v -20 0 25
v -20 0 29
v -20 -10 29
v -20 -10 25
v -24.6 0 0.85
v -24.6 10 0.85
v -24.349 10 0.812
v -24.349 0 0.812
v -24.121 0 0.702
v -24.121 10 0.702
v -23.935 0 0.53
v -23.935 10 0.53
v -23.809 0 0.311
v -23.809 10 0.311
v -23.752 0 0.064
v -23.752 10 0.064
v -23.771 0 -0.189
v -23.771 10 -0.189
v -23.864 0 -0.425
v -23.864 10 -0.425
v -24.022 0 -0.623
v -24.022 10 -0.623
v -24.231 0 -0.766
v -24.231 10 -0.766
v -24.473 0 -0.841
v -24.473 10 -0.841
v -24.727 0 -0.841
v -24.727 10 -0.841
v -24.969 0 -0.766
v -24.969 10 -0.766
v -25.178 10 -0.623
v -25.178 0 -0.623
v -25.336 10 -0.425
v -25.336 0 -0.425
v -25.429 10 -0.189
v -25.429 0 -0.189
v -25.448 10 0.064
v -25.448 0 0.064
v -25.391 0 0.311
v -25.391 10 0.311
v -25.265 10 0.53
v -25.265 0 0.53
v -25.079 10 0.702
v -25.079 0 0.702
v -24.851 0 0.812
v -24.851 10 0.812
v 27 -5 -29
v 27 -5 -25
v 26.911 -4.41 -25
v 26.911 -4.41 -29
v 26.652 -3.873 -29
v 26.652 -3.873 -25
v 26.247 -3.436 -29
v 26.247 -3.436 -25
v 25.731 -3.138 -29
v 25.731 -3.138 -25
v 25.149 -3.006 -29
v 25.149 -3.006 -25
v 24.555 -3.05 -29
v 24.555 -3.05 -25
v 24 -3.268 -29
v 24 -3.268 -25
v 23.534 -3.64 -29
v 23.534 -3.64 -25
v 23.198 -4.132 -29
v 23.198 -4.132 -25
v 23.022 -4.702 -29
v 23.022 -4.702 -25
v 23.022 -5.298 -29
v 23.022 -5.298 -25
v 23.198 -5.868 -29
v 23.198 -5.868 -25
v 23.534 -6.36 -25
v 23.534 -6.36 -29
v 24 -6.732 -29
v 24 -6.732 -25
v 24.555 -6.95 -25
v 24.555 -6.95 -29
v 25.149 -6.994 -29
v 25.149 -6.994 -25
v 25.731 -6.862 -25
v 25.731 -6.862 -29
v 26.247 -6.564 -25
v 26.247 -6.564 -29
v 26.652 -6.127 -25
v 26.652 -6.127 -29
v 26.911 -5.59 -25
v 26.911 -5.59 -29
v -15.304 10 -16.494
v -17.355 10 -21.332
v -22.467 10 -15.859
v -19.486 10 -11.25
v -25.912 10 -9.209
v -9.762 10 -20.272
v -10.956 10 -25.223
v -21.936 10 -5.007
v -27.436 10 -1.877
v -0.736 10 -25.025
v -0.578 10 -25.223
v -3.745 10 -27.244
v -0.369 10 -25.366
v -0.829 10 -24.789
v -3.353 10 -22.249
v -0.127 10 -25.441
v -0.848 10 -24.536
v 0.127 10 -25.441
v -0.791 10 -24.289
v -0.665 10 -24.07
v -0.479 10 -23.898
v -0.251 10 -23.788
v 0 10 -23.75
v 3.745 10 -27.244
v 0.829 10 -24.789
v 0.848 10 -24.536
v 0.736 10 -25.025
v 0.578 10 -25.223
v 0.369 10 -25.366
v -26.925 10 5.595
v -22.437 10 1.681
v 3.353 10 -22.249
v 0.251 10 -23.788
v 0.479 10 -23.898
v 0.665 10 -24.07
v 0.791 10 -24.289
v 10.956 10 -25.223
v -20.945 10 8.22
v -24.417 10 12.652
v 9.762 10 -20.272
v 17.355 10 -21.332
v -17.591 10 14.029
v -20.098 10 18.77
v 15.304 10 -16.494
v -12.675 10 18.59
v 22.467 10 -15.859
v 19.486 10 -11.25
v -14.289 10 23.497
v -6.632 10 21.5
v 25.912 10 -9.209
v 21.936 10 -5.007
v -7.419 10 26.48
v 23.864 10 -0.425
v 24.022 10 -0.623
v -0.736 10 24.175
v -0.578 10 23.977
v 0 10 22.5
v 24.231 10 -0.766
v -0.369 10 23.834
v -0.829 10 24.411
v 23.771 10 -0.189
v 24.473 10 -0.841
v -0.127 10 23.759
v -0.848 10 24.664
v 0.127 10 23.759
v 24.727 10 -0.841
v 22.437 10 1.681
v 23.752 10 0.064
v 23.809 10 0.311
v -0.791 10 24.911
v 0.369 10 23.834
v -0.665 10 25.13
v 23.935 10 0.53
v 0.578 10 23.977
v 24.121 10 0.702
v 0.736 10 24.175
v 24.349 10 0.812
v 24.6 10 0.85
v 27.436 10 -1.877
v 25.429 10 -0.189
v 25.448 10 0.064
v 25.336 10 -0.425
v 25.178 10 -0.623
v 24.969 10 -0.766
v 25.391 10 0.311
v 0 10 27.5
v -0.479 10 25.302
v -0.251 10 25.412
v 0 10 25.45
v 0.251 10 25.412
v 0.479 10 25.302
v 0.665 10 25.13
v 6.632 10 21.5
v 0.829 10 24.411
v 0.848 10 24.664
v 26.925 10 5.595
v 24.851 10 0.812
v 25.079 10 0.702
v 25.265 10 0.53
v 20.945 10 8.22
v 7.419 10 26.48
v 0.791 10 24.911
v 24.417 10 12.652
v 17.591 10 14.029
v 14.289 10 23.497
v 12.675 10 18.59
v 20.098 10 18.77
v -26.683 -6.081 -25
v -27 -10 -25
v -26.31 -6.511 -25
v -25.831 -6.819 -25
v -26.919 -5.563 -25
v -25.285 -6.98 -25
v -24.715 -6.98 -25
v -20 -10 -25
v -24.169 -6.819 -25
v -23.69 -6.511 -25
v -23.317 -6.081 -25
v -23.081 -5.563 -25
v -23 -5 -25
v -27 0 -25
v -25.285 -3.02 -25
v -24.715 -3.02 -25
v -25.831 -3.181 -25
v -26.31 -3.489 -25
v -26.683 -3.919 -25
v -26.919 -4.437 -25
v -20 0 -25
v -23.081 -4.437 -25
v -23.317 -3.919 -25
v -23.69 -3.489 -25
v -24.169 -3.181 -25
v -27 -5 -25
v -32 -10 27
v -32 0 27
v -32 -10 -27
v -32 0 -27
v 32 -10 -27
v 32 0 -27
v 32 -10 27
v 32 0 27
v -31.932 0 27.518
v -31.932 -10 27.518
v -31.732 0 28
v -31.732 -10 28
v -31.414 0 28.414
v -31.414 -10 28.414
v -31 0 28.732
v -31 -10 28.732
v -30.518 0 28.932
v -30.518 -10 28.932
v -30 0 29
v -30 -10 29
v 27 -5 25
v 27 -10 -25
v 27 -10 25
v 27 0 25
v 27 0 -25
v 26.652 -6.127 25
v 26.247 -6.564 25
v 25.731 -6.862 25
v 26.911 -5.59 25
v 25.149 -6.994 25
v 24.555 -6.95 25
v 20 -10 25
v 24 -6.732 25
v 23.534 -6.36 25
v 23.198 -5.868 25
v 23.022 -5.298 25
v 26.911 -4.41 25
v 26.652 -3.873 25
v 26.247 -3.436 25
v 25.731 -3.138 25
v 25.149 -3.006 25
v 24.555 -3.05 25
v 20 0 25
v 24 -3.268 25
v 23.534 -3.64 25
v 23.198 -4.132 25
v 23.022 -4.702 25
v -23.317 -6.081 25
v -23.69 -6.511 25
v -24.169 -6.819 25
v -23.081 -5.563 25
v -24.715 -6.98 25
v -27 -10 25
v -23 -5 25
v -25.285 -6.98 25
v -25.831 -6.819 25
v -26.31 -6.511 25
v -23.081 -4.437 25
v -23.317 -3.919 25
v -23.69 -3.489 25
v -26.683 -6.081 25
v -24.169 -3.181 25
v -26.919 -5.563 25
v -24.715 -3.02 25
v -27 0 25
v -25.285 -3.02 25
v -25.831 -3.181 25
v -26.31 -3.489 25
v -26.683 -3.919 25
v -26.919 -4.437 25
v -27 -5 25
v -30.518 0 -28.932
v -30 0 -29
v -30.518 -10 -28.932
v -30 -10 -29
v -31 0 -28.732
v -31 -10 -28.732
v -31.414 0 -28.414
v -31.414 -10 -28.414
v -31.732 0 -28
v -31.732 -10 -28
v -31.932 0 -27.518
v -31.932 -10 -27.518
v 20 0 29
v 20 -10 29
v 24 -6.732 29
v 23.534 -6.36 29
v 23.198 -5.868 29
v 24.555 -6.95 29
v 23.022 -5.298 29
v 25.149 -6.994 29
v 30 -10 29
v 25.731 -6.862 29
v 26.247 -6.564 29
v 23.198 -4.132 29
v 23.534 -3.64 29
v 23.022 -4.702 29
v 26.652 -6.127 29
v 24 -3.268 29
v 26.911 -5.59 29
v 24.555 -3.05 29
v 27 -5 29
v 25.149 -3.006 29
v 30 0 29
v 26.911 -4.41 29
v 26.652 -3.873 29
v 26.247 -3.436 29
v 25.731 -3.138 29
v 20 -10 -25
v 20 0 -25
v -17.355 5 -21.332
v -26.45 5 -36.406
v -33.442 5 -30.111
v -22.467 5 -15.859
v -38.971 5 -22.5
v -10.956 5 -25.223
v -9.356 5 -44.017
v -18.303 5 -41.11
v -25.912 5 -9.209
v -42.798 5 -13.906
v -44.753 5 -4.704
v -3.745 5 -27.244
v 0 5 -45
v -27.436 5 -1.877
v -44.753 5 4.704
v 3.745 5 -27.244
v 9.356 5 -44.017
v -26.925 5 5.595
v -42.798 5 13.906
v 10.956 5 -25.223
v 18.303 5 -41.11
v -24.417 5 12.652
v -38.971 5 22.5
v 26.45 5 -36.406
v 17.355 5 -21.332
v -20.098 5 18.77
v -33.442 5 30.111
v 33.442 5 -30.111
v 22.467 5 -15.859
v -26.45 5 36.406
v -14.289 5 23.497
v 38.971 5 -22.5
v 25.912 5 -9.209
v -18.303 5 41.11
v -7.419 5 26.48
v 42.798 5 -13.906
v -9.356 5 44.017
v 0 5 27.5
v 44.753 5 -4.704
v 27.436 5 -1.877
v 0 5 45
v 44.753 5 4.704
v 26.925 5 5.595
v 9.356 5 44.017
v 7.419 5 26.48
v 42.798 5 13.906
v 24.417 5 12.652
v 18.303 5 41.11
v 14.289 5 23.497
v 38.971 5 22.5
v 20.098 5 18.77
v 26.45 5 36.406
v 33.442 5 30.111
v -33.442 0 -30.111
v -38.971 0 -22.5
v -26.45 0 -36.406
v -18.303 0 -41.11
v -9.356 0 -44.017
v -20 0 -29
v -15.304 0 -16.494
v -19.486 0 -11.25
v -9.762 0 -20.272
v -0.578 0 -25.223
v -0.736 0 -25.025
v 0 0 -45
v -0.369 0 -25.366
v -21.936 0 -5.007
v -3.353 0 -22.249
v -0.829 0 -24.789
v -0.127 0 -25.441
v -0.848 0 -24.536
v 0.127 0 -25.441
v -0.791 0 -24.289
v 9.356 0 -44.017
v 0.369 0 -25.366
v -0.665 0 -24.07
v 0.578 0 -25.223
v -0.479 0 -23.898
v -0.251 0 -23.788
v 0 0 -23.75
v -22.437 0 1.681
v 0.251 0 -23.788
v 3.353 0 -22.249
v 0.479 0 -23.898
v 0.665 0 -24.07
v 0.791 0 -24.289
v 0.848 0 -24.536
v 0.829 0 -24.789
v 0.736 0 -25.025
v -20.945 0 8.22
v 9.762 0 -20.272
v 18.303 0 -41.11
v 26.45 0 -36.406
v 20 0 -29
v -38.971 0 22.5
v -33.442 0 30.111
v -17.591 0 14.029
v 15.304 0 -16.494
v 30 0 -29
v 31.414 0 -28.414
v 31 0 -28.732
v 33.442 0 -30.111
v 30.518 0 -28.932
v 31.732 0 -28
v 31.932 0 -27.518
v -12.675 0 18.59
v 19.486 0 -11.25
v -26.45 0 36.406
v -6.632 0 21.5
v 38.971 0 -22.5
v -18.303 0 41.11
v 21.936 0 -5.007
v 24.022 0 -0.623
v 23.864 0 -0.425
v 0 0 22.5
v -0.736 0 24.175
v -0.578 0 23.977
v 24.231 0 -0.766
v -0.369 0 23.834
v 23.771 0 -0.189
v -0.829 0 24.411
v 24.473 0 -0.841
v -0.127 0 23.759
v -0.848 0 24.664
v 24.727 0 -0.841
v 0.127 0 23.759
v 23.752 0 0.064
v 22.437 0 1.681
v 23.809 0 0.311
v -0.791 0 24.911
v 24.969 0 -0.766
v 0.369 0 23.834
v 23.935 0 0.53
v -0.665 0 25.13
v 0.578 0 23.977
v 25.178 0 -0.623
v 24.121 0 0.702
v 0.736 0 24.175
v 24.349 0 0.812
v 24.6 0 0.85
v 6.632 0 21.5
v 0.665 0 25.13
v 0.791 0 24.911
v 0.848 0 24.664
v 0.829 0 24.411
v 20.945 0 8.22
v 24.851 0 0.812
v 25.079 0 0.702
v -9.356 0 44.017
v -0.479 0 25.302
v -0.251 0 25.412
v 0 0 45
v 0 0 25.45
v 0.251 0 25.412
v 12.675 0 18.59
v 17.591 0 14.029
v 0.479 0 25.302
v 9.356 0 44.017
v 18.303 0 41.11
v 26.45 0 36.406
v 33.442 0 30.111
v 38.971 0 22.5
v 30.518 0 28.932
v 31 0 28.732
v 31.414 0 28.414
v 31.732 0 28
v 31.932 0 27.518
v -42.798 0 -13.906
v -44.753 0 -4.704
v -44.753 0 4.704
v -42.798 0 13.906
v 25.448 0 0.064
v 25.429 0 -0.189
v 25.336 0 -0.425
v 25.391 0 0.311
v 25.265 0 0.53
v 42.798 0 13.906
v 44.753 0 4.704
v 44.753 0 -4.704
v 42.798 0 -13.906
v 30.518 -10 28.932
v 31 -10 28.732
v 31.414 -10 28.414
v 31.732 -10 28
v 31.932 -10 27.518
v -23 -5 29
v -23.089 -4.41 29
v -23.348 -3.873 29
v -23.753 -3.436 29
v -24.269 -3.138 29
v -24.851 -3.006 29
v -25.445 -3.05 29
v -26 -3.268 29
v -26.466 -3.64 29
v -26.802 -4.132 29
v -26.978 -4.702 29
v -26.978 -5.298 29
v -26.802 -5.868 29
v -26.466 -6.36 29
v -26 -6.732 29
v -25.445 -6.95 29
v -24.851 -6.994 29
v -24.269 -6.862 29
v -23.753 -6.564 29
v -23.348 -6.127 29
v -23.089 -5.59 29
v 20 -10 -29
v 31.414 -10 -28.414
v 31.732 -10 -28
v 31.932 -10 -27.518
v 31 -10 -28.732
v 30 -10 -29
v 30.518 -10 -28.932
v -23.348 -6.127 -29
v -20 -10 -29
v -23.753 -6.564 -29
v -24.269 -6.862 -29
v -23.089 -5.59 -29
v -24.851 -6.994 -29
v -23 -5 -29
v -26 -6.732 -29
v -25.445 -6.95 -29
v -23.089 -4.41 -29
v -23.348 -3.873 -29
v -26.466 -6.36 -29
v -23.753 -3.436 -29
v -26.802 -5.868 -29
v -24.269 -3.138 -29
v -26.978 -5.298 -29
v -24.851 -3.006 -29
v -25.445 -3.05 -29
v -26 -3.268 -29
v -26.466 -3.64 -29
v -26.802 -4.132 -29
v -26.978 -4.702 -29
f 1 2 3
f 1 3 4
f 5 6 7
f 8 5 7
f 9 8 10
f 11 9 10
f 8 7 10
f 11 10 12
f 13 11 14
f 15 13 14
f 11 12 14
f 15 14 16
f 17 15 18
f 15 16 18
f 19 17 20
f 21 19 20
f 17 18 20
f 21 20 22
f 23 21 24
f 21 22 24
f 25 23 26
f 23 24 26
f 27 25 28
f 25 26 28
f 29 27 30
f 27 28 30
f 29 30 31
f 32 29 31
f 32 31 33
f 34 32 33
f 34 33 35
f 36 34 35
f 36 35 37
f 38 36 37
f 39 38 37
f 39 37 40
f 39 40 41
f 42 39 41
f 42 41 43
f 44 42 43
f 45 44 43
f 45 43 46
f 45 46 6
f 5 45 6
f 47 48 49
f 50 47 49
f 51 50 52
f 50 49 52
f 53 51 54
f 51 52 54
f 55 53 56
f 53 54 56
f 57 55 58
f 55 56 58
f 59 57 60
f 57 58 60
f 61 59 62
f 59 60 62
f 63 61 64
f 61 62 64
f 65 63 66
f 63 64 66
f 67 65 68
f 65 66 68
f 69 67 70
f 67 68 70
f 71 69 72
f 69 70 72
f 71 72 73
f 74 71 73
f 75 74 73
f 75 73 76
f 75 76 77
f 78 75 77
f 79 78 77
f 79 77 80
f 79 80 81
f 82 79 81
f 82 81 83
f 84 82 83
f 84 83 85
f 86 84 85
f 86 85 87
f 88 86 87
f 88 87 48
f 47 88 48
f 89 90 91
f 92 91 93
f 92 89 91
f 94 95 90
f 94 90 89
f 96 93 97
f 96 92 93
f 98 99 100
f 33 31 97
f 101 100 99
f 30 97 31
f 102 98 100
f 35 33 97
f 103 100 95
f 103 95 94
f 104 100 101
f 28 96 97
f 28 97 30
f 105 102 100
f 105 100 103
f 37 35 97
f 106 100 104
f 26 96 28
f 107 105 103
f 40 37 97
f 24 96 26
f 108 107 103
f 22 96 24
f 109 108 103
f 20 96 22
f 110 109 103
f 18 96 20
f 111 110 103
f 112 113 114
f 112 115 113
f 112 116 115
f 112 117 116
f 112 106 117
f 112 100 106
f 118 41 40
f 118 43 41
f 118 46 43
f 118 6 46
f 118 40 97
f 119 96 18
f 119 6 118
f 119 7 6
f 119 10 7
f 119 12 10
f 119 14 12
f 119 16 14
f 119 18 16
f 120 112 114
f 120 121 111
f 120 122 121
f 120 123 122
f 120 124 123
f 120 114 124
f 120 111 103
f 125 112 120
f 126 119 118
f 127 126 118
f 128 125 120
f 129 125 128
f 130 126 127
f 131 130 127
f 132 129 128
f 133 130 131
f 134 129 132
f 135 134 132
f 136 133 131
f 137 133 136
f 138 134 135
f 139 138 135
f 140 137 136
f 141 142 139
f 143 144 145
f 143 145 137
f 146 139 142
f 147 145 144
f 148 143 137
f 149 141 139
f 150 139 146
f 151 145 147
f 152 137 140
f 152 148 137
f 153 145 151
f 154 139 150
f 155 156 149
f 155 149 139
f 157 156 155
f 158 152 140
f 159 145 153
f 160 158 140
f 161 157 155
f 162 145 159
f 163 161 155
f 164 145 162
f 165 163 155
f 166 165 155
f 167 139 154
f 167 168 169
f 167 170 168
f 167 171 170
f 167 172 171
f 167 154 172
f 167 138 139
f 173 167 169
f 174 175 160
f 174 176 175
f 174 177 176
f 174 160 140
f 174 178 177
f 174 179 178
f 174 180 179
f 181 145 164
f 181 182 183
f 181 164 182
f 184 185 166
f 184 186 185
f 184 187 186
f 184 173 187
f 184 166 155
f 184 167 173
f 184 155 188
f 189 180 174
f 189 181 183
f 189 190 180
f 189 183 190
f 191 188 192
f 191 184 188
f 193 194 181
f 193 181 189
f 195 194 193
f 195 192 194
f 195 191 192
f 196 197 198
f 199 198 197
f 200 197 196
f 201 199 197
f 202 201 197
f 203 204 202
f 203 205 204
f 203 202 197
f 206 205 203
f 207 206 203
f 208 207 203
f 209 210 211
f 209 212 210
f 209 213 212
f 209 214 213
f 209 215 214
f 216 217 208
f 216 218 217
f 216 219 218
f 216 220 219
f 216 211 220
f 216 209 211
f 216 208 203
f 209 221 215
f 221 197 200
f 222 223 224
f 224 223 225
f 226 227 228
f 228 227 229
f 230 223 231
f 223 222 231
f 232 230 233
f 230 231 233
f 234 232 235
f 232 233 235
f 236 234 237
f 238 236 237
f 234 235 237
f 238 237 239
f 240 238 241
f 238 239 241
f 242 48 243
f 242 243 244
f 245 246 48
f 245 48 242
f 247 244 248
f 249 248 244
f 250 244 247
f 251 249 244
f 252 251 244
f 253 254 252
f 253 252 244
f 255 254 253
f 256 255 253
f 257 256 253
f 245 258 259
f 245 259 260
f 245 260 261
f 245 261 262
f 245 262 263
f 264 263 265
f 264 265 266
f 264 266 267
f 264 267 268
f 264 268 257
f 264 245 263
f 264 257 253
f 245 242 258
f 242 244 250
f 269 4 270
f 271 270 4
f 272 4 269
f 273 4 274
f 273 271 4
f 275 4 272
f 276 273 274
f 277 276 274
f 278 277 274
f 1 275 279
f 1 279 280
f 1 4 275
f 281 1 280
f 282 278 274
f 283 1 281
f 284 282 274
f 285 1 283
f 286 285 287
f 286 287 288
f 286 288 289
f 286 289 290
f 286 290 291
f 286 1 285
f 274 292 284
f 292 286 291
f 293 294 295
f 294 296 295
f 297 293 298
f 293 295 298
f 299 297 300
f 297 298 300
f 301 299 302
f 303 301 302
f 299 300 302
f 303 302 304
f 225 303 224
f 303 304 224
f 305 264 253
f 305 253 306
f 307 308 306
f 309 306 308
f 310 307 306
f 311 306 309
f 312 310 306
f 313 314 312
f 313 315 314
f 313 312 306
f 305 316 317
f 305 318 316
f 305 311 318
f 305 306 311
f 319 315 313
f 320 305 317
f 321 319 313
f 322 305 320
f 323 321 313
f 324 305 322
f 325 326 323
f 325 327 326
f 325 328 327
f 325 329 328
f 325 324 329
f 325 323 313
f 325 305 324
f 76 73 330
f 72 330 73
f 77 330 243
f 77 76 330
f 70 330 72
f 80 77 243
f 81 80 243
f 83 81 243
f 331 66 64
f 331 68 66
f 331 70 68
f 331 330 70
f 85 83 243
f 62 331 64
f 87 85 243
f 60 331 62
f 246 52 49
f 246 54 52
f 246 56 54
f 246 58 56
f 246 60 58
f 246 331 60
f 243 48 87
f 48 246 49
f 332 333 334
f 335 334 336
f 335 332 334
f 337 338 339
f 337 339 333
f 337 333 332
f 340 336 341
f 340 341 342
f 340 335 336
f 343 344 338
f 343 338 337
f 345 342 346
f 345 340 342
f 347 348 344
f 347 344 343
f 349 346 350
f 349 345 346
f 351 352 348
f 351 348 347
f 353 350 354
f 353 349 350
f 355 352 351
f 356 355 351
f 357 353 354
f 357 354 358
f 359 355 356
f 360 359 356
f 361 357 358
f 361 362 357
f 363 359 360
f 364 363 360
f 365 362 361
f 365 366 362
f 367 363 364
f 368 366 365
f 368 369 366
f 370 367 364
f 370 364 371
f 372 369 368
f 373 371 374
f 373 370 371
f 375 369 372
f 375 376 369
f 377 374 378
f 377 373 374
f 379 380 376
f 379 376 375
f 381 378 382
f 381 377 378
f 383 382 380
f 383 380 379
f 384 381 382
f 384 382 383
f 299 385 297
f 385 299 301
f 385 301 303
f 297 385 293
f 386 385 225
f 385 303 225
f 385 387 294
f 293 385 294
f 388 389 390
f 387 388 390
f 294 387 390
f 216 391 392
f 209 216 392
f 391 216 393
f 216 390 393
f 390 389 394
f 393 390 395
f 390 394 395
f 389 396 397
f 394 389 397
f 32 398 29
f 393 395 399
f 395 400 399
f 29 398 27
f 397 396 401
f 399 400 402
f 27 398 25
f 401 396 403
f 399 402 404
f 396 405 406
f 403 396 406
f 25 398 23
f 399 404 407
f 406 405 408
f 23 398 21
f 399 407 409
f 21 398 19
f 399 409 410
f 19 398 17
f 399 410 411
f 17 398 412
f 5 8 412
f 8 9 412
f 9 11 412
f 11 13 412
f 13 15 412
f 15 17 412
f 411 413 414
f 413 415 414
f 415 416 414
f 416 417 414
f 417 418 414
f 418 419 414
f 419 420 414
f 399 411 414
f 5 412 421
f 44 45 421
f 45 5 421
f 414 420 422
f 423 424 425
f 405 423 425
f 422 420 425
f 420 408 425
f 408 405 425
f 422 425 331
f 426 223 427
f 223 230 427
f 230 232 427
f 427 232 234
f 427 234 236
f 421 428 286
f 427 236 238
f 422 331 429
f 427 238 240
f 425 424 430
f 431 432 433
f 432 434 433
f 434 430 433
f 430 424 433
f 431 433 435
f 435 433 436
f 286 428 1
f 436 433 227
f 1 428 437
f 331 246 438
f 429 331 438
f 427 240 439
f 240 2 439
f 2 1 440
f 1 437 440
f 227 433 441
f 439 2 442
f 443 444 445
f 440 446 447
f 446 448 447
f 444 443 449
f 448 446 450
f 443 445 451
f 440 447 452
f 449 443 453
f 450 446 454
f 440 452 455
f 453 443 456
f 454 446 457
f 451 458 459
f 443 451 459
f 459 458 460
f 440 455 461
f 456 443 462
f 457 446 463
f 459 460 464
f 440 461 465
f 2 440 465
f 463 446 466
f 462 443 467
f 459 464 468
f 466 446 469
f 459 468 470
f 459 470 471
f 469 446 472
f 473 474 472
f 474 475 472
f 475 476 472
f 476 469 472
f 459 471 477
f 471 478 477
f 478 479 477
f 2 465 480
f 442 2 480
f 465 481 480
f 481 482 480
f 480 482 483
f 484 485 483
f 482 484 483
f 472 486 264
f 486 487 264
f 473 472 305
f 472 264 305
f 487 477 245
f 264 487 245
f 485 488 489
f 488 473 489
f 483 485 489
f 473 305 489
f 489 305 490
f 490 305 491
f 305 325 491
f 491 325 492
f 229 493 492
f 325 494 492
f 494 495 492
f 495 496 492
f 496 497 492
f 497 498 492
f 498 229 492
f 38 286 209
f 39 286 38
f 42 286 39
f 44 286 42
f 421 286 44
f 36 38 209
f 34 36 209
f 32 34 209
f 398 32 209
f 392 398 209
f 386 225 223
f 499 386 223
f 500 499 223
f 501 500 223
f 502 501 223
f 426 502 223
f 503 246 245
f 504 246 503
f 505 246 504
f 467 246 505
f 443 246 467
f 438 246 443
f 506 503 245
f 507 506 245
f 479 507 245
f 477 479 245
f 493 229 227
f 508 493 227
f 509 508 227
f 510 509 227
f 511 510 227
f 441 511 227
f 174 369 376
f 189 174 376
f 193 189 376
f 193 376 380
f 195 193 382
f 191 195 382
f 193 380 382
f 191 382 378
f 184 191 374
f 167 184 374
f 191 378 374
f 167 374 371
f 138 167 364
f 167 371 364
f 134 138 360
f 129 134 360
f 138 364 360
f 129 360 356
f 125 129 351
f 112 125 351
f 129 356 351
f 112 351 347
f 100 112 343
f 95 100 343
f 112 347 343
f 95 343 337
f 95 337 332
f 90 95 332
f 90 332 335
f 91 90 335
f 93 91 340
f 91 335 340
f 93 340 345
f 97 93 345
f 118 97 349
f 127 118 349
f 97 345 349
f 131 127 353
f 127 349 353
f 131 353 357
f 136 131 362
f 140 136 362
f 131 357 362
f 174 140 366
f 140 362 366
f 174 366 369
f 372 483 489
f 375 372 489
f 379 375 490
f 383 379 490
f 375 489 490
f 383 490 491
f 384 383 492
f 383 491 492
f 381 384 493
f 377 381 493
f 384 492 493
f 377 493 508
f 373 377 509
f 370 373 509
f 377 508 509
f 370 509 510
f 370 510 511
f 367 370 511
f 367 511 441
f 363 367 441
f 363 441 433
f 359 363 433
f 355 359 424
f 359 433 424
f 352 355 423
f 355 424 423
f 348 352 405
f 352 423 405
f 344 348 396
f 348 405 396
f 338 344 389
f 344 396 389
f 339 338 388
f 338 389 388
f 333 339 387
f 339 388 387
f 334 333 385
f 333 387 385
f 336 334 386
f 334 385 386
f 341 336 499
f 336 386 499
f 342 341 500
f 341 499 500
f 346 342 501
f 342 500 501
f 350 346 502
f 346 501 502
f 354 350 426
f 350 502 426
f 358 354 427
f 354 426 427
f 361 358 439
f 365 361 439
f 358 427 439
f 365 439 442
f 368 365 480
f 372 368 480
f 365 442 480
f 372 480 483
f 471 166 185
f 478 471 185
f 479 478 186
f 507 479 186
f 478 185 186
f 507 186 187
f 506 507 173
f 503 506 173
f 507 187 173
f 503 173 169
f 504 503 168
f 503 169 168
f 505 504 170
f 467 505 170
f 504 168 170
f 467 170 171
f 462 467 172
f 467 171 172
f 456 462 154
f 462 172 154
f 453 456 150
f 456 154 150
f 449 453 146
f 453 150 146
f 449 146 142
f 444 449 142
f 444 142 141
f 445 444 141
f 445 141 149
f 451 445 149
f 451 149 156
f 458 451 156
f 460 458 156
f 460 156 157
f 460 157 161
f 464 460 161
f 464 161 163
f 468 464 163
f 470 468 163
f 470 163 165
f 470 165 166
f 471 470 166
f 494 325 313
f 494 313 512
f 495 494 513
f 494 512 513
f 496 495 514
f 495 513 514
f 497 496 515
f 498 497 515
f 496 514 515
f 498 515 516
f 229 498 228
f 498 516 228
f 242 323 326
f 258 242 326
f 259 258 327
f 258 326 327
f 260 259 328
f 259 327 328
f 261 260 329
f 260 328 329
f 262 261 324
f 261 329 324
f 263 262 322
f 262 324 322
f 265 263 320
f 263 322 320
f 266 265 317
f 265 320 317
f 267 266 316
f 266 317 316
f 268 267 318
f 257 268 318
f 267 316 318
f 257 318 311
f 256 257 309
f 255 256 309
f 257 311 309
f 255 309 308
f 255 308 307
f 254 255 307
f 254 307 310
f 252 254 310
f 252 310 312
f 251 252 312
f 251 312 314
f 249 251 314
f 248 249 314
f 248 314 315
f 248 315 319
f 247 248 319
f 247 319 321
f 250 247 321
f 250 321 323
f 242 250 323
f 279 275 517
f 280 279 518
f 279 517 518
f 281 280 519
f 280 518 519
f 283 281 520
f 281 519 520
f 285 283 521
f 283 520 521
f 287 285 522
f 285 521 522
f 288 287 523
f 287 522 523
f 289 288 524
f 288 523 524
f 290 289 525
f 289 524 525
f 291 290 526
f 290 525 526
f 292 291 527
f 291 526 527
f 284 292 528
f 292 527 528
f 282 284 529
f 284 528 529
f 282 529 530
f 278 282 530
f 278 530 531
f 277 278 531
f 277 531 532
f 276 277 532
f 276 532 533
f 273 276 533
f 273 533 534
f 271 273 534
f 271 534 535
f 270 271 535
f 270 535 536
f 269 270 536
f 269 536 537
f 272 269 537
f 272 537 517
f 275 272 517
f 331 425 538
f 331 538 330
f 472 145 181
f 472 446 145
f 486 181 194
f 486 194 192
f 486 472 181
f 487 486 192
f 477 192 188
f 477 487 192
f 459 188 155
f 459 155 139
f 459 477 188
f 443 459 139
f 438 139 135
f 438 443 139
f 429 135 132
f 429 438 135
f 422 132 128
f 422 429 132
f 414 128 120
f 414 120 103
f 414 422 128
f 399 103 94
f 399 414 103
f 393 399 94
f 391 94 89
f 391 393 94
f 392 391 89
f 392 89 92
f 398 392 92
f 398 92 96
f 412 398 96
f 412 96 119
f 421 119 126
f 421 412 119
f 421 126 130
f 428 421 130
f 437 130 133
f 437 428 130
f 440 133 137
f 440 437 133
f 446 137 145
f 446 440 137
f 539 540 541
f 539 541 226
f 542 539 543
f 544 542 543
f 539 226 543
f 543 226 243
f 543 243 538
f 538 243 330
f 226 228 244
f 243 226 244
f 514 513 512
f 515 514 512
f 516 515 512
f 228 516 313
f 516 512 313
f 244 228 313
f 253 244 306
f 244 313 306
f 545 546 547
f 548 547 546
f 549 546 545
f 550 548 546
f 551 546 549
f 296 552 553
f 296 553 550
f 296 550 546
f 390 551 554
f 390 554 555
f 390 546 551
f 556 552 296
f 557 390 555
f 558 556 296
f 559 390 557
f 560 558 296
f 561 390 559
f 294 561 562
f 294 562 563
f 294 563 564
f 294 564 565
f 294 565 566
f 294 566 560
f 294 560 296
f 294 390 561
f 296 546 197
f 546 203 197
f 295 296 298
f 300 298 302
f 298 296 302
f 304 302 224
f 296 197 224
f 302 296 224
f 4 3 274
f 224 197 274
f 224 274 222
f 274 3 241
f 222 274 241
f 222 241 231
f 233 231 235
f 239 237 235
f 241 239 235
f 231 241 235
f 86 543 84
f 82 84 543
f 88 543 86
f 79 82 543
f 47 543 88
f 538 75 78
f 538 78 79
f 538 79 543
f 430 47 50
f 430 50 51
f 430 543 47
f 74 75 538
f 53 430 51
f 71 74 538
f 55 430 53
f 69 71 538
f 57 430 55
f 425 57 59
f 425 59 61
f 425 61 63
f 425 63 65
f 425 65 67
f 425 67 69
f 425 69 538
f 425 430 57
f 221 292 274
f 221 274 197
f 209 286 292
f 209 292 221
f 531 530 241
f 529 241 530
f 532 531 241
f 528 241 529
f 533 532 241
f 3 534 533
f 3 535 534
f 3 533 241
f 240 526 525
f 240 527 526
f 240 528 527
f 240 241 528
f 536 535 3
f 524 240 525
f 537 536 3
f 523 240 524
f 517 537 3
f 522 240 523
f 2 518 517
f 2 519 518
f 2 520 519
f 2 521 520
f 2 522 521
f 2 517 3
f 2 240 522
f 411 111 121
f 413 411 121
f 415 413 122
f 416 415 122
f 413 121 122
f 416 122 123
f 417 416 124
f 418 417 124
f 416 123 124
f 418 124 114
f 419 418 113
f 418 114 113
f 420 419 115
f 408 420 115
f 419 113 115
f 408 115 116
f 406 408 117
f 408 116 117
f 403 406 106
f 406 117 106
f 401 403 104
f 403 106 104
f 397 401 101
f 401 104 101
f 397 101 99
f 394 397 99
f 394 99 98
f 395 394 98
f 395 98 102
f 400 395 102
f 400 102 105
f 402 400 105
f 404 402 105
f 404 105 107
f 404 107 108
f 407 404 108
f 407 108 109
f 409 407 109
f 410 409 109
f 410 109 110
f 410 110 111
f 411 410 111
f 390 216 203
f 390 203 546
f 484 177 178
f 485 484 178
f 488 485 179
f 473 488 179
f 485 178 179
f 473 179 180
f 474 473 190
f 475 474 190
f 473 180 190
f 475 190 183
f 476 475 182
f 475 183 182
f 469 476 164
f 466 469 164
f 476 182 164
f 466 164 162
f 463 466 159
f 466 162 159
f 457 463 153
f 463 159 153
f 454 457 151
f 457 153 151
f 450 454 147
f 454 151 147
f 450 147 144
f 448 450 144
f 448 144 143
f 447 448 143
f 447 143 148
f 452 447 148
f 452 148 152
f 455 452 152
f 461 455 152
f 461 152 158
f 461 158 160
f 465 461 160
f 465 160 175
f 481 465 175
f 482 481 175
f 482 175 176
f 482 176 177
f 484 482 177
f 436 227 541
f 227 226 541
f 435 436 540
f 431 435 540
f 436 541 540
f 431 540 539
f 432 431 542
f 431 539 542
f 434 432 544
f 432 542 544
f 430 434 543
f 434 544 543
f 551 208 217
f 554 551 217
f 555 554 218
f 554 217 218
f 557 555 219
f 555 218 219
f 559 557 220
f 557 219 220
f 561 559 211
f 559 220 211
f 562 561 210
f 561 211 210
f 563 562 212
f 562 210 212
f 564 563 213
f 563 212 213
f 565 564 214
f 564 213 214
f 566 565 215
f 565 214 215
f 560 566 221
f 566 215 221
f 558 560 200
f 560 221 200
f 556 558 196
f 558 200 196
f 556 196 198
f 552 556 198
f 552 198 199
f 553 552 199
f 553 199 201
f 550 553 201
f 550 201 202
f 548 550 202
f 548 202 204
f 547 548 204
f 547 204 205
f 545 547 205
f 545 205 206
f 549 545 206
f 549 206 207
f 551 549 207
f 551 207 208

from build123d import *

# Parameters (mm, degrees)
SKETCH_2_R          = 45
SKETCH_2_R_2        = 22.5
EXTRUDE_1_DEPTH     = 5
EXTRUDE_2_DEPTH     = 10
FILLET_1_R          = 2
SKETCH_4_R          = 2
CUT_EXTRUDE_1_DEPTH = 88.183714076
SKETCH_5_R          = 27.5
SKETCH_5_R_2        = 22.5
EXTRUDE_3_DEPTH     = 5
SKETCH_6_R          = 0.85
CUT_EXTRUDE_2_DEPTH = 67.708320321


with BuildPart() as part:
    # 草图2 → 凸台-拉伸1 (new body)
    with BuildSketch(Plane(origin=(0, 0, 0), x_dir=(1, 0, 0), z_dir=(0, 1, 0))):
        with Locations(Location((0, 0, 0), (0, 0, 270))):
            Circle(SKETCH_2_R)
        with Locations(Location((0, 0, 0), (0, 0, 270))):
            Circle(SKETCH_2_R_2, mode=Mode.SUBTRACT)
    extrude(amount=EXTRUDE_1_DEPTH)

    # 草图3 → 凸台-拉伸2 (add)
    with BuildSketch(Plane.XZ):
        Polygon((-27, 25), (-27, -25), (-20, -25), (-20, -29), (-32, -29), (-32, -25), (-32, 25), (-32, 29), (-20, 29), (-20, 25), align=None)
        Polygon((20, -29), (20, -25), (27, -25), (27, 25), (20, 25), (20, 29), (32, 29), (32, 25), (32, -25), (32, -29), align=None)
    extrude(amount=EXTRUDE_2_DEPTH)

    # 圆角1
    fillet_1_edges = [part.edges().sort_by_distance(p)[0] for p in [
        (-32, -5, 29),
        (-32, -5, -29),
        (32, -5, -29),
        (32, -5, 29),
    ]]
    fillet(fillet_1_edges, radius=FILLET_1_R)

    # 草图4 → 切除-拉伸1 (cut, through all)
    with BuildSketch(Plane.XY.offset(29)):
        with Locations((-25, -5)):
            Circle(SKETCH_4_R)
        with Locations((25, -5)):
            Circle(SKETCH_4_R)
    extrude(amount=-CUT_EXTRUDE_1_DEPTH, mode=Mode.SUBTRACT)

    # 草图5 → 凸台-拉伸3 (add)
    with BuildSketch(Plane(origin=(0, 5, 0), x_dir=(1, 0, 0), z_dir=(0, 1, 0))):
        with Locations(Location((0, 0, 0), (0, 0, 270))):
            Circle(SKETCH_5_R)
        with Locations(Location((0, 0, 0), (0, 0, 270))):
            Circle(SKETCH_5_R_2, mode=Mode.SUBTRACT)
    extrude(amount=EXTRUDE_3_DEPTH)

    # 草图6 → 切除-拉伸2 (cut, through all)
    with BuildSketch(Plane(origin=(0, 10, 0), x_dir=(1, 0, 0), z_dir=(0, 1, 0))):
        with Locations(Location((0, 24.6, 0), (0, 0, 270))):
            Circle(SKETCH_6_R)
        with Locations(Location((24.6, 0, 0), (0, 0, 270))):
            Circle(SKETCH_6_R)
        with Locations(Location((0, -24.6, 0), (0, 0, 270))):
            Circle(SKETCH_6_R)
        with Locations(Location((-24.6, 0, 0), (0, 0, 270))):
            Circle(SKETCH_6_R)
    extrude(amount=-CUT_EXTRUDE_2_DEPTH, mode=Mode.SUBTRACT)


solid = part.part
